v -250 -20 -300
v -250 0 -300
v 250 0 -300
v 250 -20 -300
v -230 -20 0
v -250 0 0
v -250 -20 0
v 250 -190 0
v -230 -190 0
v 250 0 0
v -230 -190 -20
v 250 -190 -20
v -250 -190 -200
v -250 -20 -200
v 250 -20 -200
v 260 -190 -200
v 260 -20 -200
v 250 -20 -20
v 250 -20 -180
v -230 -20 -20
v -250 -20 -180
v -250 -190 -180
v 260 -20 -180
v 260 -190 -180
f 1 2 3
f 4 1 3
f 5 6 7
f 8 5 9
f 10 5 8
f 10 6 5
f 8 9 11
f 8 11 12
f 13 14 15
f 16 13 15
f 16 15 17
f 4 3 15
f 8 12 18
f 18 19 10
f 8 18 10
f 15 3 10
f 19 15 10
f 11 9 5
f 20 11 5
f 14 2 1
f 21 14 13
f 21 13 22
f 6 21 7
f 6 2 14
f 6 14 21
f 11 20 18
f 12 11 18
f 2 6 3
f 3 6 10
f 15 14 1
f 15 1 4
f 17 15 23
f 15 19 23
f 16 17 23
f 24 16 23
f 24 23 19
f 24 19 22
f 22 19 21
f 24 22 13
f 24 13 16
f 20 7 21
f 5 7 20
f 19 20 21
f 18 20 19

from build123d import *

# Parameters (mm, degrees)
F0_W     = 480
F0_H     = 190
F1_DEPTH = 20
F2_W     = 500
F2_H     = 300
F3_DEPTH = 20
F4_W     = 10
F4_H     = 20
F4_W_2   = 500
F5_DEPTH = 170


# Not quite as in the source:
# - the program builds the solid bodies; features that only make, move or delete a surface that nothing else refers to are left out


with BuildPart() as f1:
    # F0 (on Top) → F1 (new body)
    with BuildSketch(Plane.XY):
        with Locations((10, -95)):
            Rectangle(F0_W, F0_H)
    extrude(amount=-F1_DEPTH)

    # F2 (on Front) → F3 (join)
    with BuildSketch(Plane.XZ):
        with Locations((0, -150)):
            Rectangle(F2_W, F2_H)
    extrude(amount=F3_DEPTH)

    # F4 (on face) → F5 (join)
    with BuildSketch(Plane.XZ.offset(20)):
        with Locations((255, -190)):
            Rectangle(F4_W, F4_H)
        with Locations((0, -190)):
            Rectangle(F4_W_2, F4_H)
    extrude(amount=F5_DEPTH)


solid = f1.part
